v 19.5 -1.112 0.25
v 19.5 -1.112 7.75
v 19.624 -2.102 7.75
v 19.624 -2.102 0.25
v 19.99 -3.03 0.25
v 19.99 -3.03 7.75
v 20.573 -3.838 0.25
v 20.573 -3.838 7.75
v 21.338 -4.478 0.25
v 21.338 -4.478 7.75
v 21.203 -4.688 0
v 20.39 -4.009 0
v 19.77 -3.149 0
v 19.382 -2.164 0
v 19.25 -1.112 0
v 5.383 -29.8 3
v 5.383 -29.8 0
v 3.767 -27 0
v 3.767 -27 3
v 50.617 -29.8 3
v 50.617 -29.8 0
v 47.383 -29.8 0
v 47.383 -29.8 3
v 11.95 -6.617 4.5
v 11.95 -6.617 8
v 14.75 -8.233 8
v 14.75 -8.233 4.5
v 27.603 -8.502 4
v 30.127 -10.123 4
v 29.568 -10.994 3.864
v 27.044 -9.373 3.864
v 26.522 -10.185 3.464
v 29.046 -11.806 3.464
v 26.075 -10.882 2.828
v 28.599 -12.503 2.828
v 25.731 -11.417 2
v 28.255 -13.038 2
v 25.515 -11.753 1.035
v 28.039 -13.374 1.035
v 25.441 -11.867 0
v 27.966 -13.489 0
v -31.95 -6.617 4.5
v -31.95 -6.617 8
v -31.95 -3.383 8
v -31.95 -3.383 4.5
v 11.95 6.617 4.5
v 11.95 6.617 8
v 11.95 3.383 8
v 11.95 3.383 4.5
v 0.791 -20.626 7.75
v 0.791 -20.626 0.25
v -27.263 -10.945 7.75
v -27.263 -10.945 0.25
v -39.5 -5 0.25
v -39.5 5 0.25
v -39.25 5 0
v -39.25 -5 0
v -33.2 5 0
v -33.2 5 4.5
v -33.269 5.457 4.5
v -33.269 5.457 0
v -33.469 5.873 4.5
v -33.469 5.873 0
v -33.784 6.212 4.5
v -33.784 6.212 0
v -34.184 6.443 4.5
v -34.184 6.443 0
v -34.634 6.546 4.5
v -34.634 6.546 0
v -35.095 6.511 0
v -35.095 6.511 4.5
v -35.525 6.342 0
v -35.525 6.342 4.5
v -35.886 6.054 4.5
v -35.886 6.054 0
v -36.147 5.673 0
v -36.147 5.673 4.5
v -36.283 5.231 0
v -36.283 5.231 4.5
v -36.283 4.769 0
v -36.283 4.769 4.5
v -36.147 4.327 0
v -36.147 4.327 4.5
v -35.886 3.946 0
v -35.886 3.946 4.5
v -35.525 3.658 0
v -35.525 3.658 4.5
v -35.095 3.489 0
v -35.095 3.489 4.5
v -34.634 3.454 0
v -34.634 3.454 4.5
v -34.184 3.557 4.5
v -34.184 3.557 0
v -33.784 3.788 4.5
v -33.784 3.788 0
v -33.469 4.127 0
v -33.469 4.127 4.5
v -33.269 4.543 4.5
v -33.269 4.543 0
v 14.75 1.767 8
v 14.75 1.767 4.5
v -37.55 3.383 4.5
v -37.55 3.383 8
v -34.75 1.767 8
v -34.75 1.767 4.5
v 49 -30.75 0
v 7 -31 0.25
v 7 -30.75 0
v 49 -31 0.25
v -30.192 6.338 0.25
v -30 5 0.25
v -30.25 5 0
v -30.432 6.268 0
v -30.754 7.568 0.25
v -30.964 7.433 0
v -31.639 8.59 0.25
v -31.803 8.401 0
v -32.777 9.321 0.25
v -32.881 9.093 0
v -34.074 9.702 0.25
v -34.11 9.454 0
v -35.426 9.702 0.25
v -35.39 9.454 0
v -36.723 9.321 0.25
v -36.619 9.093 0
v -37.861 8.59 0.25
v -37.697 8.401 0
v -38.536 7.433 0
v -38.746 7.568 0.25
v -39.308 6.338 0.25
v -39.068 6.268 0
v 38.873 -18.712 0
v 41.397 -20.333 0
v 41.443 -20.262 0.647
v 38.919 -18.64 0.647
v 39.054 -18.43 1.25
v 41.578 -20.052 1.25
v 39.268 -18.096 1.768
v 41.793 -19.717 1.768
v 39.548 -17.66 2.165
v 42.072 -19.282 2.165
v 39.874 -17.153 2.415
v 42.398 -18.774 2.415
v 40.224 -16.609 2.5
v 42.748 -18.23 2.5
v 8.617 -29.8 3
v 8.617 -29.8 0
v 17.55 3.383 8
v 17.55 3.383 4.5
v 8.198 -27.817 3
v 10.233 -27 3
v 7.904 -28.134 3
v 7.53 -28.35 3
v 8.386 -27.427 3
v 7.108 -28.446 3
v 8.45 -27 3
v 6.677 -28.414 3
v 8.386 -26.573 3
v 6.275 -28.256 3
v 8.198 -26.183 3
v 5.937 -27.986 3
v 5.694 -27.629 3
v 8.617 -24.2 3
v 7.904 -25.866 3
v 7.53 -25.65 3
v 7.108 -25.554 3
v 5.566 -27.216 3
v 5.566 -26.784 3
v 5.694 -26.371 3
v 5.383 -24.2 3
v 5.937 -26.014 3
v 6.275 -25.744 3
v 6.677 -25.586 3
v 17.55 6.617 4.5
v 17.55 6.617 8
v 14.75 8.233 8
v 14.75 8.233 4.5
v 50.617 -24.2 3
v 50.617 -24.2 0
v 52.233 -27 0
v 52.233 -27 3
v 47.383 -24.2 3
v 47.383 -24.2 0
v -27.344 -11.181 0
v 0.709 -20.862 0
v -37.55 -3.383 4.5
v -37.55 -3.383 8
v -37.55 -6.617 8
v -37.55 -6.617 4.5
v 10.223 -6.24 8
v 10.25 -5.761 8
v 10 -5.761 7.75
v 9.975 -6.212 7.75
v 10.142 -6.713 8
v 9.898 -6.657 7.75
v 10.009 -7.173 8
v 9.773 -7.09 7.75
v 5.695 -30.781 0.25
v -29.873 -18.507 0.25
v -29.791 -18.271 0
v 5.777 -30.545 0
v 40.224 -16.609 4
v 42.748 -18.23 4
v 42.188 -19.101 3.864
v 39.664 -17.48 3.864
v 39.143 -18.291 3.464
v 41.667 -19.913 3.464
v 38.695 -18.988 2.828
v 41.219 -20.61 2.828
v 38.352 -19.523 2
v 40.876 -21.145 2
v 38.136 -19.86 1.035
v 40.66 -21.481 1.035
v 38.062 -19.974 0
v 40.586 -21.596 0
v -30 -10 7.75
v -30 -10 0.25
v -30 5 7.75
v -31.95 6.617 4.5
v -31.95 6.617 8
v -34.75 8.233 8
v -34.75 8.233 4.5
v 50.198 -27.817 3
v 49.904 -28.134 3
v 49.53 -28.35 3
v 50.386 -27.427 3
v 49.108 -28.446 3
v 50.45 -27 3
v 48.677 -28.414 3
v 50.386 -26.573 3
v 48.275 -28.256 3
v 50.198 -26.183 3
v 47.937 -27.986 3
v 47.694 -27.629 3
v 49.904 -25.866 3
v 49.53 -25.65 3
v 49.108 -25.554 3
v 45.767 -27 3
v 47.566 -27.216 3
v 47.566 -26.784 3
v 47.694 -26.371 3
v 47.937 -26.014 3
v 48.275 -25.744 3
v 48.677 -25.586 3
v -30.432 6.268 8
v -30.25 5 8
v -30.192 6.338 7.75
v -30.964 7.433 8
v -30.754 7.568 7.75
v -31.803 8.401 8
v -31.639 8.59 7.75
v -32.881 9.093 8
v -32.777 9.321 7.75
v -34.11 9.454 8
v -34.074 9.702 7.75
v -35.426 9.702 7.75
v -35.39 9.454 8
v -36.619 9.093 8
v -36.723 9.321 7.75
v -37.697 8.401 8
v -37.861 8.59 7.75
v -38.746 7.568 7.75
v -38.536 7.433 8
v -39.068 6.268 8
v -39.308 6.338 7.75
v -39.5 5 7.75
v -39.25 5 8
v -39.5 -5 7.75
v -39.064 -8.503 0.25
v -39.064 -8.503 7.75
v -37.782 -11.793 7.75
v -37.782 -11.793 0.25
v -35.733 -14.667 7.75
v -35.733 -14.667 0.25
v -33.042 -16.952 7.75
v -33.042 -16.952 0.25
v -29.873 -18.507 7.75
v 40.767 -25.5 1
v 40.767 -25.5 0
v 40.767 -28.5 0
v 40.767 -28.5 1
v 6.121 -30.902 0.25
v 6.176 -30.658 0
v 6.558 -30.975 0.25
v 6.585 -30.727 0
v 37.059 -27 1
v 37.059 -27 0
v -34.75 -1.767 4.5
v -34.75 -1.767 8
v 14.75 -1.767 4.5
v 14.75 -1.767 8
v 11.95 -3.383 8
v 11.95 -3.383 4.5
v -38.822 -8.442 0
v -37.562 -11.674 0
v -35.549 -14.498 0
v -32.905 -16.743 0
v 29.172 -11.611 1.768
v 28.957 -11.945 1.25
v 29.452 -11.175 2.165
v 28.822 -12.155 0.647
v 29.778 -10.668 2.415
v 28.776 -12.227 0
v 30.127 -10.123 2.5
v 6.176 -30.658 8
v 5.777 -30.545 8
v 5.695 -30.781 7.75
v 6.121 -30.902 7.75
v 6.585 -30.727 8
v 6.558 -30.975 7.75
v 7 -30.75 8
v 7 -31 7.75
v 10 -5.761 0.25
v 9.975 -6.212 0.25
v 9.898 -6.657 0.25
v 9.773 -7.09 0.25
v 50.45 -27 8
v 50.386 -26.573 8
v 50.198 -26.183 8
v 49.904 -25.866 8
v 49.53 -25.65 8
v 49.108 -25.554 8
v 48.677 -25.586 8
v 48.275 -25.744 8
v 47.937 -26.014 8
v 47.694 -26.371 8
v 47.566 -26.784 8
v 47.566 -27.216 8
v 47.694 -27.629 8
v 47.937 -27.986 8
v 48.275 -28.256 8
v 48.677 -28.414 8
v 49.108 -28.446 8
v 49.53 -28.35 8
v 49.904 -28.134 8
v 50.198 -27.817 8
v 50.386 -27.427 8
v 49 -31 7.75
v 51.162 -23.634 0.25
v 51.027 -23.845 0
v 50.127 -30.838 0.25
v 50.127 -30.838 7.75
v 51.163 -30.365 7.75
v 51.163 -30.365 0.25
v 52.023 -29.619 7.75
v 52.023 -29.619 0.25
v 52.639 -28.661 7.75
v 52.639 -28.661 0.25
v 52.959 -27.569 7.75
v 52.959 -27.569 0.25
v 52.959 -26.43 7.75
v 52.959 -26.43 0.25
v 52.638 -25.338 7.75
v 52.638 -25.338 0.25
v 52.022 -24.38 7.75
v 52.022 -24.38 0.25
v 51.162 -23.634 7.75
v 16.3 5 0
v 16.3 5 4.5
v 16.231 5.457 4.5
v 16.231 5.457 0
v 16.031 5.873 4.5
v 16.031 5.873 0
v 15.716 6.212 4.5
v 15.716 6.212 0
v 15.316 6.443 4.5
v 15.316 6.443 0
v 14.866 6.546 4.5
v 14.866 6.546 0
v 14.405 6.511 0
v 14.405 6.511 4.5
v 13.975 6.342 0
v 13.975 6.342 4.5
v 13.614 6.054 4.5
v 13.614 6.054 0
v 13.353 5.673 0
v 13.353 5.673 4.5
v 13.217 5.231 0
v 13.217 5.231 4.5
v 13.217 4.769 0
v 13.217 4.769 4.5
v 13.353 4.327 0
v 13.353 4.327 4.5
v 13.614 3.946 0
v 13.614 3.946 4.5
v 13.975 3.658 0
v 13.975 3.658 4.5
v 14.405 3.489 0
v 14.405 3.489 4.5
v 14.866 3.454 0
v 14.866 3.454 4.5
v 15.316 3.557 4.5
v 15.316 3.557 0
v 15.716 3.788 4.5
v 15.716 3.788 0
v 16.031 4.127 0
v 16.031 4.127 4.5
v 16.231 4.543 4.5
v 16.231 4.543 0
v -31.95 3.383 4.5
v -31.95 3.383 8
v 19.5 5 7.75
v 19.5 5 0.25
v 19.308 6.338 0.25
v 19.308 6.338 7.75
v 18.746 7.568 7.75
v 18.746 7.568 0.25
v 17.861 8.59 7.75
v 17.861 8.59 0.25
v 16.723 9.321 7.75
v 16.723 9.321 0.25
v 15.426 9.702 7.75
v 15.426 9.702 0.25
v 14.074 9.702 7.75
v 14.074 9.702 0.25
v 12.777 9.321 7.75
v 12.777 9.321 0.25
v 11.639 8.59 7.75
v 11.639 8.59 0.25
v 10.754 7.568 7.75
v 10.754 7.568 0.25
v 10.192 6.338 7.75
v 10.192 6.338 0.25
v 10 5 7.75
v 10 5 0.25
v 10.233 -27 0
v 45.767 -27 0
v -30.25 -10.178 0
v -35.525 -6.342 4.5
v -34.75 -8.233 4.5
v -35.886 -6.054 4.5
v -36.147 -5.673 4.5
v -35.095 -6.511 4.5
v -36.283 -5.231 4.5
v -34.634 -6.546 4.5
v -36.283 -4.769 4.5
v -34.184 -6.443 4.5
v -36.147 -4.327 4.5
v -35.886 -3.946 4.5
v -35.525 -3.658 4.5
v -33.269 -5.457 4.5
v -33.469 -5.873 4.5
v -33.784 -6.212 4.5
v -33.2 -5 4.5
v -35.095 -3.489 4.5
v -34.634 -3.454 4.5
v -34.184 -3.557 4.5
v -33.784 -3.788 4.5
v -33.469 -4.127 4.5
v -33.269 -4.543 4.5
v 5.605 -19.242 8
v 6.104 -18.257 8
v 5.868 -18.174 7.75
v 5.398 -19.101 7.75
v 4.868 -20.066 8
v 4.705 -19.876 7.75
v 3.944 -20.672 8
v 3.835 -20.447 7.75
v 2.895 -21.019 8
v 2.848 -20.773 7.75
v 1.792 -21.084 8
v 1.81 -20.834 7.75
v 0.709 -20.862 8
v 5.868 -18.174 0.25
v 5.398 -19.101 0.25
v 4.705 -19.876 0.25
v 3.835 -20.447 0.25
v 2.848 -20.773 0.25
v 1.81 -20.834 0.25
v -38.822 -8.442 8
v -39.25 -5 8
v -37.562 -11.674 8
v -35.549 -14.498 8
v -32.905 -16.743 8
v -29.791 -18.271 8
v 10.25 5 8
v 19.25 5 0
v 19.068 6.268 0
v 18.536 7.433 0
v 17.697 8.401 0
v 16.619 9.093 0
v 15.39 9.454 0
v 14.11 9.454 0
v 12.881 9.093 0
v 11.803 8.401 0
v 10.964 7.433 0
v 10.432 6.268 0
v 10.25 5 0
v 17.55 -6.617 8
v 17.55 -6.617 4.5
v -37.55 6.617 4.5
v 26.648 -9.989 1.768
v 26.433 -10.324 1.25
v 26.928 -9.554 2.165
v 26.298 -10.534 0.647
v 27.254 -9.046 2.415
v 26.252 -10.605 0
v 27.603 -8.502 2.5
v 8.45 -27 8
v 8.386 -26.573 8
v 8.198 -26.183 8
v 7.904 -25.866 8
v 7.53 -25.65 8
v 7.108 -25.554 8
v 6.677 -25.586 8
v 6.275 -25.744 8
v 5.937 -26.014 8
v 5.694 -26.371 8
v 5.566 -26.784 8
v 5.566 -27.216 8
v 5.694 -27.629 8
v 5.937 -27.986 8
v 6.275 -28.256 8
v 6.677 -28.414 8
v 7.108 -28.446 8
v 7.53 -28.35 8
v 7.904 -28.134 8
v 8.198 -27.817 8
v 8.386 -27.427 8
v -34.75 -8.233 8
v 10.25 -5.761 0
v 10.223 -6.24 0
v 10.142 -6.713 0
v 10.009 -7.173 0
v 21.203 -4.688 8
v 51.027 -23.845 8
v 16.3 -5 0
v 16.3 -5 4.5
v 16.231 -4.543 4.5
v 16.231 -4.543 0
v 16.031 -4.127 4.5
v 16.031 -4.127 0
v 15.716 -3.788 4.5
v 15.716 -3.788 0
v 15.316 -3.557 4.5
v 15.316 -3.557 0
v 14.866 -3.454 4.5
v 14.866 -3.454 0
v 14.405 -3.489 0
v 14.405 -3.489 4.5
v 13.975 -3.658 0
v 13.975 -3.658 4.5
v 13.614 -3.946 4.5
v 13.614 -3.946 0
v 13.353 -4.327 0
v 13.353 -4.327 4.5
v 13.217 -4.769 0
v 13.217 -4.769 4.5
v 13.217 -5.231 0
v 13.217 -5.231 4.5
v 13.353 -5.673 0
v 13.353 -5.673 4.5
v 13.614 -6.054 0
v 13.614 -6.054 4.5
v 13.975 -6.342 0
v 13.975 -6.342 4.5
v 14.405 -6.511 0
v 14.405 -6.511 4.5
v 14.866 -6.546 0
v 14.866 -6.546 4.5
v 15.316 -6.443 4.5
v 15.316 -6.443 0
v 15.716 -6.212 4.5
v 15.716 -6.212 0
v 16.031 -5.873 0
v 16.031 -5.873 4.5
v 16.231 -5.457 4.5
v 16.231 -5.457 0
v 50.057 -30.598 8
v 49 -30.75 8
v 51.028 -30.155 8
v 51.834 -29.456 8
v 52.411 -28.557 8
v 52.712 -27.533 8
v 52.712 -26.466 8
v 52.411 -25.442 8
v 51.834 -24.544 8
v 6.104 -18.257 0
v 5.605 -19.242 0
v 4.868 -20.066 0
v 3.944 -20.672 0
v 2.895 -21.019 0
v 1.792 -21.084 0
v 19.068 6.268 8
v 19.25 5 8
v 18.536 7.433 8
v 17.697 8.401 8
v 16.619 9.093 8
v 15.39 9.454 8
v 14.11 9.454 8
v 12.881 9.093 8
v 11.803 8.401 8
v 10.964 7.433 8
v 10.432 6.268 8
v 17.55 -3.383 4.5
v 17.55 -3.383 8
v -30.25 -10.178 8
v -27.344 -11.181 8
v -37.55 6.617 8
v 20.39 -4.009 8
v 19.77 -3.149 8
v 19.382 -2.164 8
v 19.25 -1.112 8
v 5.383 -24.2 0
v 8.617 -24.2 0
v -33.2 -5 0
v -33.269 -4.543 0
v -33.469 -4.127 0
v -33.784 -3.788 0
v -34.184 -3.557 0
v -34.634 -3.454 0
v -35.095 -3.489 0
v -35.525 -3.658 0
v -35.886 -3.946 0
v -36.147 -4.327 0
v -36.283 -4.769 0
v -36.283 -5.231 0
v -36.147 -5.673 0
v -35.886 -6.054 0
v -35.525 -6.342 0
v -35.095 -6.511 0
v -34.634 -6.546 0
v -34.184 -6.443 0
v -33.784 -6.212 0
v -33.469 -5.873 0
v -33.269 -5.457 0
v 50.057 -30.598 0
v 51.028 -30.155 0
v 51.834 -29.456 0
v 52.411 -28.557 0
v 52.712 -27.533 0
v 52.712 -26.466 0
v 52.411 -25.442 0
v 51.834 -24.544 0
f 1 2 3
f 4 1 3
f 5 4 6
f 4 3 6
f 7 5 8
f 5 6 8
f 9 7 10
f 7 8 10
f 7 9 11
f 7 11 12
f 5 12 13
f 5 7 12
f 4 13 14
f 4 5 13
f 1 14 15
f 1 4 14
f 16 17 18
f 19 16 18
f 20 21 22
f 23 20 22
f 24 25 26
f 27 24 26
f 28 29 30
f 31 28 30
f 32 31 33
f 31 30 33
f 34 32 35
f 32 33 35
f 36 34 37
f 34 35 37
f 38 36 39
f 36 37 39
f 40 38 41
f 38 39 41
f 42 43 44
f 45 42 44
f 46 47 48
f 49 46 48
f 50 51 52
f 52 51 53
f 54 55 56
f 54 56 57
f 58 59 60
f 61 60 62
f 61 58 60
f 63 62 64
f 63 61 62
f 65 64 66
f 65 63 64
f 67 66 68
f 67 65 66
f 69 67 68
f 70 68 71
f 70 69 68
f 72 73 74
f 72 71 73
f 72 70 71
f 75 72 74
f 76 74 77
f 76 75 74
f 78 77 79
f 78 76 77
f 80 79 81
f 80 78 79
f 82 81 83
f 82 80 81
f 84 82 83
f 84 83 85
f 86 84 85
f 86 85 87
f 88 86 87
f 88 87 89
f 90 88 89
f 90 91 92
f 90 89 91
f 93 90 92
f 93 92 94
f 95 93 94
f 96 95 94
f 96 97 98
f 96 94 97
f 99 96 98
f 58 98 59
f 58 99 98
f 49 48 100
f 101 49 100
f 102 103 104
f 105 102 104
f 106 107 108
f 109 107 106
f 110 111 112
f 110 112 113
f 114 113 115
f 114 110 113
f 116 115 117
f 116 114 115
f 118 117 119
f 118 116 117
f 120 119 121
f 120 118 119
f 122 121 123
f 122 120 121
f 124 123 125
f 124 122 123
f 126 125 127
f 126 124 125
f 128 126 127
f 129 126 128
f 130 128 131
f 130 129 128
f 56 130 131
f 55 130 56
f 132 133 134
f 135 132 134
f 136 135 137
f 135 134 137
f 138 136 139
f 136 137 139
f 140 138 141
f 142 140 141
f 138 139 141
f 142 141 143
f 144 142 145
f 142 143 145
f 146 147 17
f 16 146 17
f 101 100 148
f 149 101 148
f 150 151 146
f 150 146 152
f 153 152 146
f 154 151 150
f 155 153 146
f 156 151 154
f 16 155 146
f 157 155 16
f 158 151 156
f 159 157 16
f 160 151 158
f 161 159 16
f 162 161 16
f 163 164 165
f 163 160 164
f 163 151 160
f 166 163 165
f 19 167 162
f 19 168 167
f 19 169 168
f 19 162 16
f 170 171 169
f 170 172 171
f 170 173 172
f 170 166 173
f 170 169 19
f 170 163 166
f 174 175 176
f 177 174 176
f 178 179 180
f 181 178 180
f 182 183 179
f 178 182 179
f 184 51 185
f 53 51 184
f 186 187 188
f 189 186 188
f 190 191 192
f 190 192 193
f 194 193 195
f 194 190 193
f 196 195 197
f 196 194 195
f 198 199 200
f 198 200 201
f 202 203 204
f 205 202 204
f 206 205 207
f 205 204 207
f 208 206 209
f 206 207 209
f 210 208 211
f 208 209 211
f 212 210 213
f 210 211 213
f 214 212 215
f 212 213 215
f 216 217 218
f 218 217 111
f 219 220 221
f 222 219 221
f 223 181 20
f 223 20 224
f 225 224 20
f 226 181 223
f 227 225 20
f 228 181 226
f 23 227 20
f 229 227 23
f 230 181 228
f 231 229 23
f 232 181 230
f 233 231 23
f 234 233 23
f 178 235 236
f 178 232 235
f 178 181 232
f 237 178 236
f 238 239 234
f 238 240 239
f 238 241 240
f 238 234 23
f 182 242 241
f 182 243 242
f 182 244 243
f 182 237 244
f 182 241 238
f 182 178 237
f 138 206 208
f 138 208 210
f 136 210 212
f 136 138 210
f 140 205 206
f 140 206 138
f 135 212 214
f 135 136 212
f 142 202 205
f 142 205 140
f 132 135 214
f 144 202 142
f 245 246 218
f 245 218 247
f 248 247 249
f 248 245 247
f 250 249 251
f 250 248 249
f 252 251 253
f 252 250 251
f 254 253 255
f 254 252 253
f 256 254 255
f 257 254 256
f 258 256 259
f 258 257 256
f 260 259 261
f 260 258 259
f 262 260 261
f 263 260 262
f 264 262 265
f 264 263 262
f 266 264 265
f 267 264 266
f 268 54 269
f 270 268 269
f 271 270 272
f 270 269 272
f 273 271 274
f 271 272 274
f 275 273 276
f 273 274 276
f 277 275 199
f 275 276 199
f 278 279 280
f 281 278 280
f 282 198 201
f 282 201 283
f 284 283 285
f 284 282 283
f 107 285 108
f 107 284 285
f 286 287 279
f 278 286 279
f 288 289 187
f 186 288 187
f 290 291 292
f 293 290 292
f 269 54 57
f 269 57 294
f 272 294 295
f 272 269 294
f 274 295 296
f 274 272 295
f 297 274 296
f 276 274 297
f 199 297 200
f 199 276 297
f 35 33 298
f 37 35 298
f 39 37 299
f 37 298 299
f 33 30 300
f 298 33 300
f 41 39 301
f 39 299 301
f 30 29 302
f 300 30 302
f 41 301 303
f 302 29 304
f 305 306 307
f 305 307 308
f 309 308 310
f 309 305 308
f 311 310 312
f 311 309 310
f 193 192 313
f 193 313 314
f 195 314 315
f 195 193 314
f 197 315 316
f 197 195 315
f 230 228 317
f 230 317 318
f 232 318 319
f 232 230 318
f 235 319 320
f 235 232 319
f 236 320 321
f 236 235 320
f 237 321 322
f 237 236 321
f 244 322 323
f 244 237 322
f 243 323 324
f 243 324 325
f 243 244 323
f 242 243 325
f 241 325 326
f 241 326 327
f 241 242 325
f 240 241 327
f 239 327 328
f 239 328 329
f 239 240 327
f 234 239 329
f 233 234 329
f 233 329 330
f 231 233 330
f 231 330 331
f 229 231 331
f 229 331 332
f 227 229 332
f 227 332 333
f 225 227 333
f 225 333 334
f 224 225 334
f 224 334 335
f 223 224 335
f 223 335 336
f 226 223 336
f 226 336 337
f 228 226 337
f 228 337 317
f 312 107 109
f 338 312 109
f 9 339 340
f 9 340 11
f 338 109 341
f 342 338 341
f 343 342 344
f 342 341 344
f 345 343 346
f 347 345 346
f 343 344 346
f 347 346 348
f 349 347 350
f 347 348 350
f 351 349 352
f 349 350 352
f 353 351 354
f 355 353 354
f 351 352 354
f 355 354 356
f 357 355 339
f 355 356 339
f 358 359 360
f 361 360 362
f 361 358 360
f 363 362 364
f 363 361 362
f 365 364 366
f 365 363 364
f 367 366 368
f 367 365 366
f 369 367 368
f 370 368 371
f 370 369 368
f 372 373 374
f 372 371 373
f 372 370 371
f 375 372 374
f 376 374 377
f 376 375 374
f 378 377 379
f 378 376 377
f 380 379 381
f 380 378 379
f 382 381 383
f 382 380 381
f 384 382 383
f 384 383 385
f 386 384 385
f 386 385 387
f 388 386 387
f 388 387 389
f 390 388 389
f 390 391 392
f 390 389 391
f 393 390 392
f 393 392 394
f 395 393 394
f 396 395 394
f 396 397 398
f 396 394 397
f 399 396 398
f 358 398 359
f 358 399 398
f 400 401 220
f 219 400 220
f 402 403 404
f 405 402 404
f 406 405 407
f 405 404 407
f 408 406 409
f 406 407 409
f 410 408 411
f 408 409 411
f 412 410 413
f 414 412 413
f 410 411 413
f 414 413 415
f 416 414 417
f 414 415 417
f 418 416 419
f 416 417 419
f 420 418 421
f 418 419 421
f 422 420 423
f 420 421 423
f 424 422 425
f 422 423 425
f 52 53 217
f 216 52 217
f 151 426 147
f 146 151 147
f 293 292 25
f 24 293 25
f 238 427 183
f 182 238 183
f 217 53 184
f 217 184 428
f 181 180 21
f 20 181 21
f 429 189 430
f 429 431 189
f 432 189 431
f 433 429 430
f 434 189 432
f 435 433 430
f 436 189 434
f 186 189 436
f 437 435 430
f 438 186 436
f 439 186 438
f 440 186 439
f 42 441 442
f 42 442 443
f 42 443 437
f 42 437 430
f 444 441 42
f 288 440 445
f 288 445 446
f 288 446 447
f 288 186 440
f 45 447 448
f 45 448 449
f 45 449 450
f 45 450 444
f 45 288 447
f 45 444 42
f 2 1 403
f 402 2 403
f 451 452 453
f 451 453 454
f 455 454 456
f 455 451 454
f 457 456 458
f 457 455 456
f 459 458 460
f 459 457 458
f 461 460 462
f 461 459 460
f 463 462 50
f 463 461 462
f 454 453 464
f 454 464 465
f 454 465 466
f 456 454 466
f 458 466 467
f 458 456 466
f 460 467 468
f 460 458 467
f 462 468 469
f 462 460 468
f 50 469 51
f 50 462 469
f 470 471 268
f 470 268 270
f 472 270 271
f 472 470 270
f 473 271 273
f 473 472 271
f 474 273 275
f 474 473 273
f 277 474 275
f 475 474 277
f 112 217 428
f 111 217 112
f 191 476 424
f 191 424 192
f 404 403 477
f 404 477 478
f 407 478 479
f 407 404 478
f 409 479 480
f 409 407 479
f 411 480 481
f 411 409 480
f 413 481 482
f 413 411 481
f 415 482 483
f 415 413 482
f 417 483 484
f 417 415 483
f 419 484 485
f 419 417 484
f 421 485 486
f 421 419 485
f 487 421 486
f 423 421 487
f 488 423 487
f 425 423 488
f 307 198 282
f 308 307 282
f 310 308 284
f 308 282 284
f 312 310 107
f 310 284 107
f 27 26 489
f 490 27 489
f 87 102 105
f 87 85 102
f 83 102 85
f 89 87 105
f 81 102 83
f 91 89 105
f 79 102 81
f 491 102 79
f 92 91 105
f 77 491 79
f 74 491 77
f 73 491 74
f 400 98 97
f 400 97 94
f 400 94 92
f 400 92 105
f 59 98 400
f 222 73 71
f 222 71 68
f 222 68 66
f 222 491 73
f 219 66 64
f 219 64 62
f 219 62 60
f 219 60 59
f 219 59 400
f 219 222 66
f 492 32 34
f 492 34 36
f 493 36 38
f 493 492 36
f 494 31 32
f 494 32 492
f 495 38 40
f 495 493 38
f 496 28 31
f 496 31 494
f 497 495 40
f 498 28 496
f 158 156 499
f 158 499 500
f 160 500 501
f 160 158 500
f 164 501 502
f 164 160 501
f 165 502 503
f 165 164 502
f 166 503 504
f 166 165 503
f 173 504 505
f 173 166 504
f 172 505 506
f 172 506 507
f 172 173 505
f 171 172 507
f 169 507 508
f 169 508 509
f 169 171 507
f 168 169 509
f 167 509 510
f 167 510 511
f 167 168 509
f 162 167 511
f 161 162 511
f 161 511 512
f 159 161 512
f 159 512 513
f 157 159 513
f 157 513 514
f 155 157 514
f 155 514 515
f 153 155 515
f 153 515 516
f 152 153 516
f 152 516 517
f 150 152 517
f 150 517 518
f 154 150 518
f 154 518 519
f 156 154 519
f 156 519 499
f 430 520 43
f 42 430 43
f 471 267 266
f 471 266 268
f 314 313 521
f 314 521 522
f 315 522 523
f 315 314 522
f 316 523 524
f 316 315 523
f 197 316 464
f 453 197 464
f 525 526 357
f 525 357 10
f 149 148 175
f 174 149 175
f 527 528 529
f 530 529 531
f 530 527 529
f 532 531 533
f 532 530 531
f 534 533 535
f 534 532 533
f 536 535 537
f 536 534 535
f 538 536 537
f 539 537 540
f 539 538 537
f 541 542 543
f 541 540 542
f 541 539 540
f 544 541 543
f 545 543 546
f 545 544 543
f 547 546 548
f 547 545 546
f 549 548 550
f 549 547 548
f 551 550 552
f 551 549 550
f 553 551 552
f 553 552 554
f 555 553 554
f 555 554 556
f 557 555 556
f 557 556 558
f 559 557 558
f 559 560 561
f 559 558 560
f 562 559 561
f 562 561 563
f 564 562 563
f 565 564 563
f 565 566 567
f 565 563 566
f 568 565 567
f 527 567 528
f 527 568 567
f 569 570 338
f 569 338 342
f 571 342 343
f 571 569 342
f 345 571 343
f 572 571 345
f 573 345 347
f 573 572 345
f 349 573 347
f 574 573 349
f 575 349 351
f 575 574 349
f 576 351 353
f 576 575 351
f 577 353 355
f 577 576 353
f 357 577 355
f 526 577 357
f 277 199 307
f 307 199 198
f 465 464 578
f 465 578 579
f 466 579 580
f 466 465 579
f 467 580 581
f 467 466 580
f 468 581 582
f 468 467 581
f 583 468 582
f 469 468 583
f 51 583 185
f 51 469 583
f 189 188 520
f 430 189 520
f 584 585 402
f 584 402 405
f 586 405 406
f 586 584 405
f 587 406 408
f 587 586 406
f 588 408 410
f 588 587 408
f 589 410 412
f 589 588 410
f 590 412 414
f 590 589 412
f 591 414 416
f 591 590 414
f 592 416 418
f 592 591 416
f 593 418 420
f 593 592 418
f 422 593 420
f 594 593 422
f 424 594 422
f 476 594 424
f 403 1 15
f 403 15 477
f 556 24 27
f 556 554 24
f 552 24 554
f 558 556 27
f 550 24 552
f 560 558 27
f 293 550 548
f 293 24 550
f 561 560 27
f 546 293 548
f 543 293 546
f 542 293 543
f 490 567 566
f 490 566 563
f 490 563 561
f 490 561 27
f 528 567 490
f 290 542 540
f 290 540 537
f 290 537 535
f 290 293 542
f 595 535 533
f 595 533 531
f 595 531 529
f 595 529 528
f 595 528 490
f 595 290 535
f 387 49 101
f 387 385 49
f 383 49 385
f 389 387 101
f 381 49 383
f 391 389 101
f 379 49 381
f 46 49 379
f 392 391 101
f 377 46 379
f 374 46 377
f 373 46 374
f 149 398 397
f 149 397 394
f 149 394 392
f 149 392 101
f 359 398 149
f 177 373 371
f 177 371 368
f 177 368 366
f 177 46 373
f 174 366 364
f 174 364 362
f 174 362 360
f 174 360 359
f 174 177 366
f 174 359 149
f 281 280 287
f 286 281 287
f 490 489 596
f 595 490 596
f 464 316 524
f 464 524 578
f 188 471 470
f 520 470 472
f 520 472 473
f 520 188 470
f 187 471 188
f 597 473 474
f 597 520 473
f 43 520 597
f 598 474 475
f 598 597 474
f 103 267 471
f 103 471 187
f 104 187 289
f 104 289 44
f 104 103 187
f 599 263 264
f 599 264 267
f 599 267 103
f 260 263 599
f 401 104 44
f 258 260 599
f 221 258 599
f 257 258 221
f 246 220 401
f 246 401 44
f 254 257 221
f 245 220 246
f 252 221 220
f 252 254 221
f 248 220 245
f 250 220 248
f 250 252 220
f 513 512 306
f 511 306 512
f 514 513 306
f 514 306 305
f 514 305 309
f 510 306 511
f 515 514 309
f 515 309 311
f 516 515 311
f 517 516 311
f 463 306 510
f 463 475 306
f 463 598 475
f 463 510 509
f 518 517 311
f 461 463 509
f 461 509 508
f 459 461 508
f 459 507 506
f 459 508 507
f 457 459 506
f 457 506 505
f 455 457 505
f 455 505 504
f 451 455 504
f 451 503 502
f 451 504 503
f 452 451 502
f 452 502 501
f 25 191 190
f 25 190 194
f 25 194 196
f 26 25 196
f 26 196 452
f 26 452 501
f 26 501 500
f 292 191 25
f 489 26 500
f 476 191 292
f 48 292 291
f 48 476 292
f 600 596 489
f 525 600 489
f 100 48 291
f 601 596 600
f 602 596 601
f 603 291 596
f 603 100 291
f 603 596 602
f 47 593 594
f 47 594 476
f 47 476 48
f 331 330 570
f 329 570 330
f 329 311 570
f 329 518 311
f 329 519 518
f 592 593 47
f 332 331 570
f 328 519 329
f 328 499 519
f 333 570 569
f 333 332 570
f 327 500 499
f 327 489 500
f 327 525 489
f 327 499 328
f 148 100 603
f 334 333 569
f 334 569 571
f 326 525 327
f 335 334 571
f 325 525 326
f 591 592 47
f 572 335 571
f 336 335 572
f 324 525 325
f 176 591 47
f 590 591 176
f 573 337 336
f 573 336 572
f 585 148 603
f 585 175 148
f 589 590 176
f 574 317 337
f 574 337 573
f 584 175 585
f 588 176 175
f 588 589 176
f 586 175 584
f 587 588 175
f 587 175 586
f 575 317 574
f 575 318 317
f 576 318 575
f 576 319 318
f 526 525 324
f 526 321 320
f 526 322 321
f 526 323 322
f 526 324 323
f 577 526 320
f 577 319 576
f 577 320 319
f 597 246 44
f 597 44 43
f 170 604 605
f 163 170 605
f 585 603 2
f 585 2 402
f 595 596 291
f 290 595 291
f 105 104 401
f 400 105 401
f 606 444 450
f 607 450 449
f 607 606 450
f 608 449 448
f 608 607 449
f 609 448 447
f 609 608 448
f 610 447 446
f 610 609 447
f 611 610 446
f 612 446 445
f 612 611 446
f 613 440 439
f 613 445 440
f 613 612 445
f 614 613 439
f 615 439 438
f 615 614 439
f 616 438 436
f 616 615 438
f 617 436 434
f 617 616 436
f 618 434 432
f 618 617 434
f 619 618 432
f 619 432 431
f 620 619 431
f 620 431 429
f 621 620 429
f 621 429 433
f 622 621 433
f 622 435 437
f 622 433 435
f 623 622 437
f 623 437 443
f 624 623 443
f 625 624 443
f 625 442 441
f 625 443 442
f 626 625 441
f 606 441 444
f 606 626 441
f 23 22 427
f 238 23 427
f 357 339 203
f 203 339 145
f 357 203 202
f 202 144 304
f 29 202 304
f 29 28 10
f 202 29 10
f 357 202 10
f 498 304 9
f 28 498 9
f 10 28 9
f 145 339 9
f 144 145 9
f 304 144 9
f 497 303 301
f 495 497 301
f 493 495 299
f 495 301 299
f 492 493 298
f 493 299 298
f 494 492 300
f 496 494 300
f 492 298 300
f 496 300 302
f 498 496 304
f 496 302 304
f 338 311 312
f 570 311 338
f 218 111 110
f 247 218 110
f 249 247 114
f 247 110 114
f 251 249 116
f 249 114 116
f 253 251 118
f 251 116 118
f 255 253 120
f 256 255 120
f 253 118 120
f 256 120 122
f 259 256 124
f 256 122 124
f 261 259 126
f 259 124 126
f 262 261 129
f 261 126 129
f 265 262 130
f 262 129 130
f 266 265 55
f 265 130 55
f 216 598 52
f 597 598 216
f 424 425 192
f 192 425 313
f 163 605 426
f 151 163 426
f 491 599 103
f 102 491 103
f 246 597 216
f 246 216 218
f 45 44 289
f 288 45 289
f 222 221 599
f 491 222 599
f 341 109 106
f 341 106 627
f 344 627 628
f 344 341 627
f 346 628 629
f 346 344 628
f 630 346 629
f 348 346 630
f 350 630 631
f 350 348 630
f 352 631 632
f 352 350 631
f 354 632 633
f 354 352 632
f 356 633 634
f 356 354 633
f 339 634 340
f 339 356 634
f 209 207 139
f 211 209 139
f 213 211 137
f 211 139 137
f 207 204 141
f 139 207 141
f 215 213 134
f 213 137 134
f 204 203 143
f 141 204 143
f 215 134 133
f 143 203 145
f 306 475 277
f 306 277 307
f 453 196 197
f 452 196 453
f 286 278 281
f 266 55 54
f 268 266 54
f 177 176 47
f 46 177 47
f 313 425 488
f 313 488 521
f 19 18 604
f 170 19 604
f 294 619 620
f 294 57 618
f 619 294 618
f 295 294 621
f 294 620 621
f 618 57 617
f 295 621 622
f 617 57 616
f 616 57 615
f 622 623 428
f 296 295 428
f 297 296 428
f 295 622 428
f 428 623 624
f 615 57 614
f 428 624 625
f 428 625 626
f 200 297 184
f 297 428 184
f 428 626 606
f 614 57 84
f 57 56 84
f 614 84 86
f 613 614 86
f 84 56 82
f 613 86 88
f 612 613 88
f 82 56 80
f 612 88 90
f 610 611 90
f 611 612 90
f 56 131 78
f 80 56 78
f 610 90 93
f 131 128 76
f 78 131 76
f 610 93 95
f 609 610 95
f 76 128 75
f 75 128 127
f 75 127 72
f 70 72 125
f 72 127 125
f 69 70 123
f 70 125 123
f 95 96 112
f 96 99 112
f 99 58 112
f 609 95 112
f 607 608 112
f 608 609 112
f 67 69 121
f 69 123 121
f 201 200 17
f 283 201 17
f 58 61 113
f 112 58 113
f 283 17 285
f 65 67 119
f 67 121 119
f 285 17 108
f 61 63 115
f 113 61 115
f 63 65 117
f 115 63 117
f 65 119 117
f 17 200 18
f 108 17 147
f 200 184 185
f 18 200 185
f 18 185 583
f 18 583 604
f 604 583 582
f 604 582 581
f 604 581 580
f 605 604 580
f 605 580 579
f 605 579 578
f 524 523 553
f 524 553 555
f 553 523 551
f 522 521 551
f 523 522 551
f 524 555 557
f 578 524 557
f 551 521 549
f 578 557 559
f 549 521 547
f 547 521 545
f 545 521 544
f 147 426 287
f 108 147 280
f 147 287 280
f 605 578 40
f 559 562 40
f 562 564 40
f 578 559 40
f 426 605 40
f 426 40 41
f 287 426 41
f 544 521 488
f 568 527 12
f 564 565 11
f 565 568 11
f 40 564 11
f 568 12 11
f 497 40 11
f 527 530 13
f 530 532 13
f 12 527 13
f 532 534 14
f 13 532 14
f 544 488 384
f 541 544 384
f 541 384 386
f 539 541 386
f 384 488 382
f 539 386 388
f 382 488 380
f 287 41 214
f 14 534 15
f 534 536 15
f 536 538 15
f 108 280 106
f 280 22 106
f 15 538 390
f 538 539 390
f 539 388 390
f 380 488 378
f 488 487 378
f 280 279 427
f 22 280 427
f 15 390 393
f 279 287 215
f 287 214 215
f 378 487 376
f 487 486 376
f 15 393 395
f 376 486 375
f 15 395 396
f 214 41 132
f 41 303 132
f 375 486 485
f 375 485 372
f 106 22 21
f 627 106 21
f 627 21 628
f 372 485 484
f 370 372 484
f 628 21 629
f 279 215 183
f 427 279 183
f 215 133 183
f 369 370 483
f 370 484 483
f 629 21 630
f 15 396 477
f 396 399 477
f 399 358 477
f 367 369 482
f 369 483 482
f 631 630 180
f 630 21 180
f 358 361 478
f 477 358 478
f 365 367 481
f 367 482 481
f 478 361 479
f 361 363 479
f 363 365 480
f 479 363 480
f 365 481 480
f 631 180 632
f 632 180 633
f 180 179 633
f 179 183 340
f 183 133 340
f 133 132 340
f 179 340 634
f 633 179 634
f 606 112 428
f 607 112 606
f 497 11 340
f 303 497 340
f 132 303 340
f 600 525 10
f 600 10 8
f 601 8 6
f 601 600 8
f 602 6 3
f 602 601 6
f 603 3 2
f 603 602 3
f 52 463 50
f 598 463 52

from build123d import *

# Parameters (mm, degrees)
SZKIC1_R                    = 1.55
SZKIC1_R_2                  = 1.45
DODANIE_WYCI_GNI_CIE1_DEPTH = 8
WYTNIJ_WYCI_GNI_CIE1_DEPTH  = 3
ZAOKR_GLENIE1_R             = 4
WYTNIJ_WYCI_GNI_CIE2_DEPTH  = 3.5
SFAZOWANIE1_SIZE            = 0.25
WYTNIJ_WYCI_GNI_CIE3_DEPTH  = 1
WYTNIJ_WYCI_GNI_CIE4_DEPTH  = 3
SZYK_LINIOWY1_COUNT         = 2
SZYK_LINIOWY1_PITCH         = 15


with BuildPart() as part:
    # Szkic1 → Dodanie-wyciągnięcie1 (new body)
    # profile 1 of 17: a face of its own
    with BuildSketch(Plane.XY):
        with BuildLine():
            Line((-30, -5), (-30, 5))
            ThreePointArc((-30, 5), (-34.75, 9.75), (-39.5, 5))
            Line((-39.5, 5), (-39.5, -5))
            ThreePointArc((-39.5, -5), (-34.75, -9.75), (-30, -5))
        make_face()
        with Locations((-34.75, -5)):
            Circle(SZKIC1_R, mode=Mode.SUBTRACT)
        with Locations((-34.75, 5)):
            Circle(SZKIC1_R, mode=Mode.SUBTRACT)
    # profile 2 of 17: a face of its own
    with BuildSketch(Plane.XY):
        with BuildLine():
            Line((-30, -10), (-30, -5))
            ThreePointArc((-30, -5), (-34.75, -9.75), (-39.5, -5))
            ThreePointArc((-39.5, -5), (-36.846817098, -13.293438899), (-29.872582883, -18.506937282))
            ThreePointArc((-29.872582883, -18.506937282), (-32.348896474, -13.420890585), (-27.262849777, -10.944576994))
            Line((-27.262849777, -10.944576994), (-30, -10))
        make_face()
    # profile 3 of 17: a face of its own
    with BuildSketch(Plane.XY):
        with BuildLine():
            Line((4.547807332, -21.922277315), (-27.262849777, -10.944576994))
            ThreePointArc((-27.262849777, -10.944576994), (-32.348896474, -13.420890585), (-29.872582883, -18.506937282))
            Line((-29.872582883, -18.506937282), (5.695133447, -30.781180144))
            ThreePointArc((5.695133447, -30.781180144), (3.398037408, -28.739501506), (3.227247846, -25.670962309))
            Line((3.227247846, -25.670962309), (4.547807332, -21.922277315))
        make_face()
    # profile 4 of 17: a face of its own
    with BuildSketch(Plane.XY):
        with BuildLine():
            Line((7.670780796, -23), (4.547807332, -21.922277315))
            Line((4.547807332, -21.922277315), (3.227247846, -25.670962309))
            ThreePointArc((3.227247846, -25.670962309), (4.688739604, -23.735329208), (7, -23))
            Line((7, -23), (7.670780796, -23))
        make_face()
    # profile 5 of 17: a face of its own
    with BuildSketch(Plane.XY):
        with BuildLine():
            Line((10, -6.445085227), (4.547807332, -21.922277315))
            Line((4.547807332, -21.922277315), (7.670780796, -23))
            Line((7.670780796, -23), (12.650026795, -23))
            Line((12.650026795, -23), (16.842670109, -11.098302851))
            Line((16.842670109, -11.098302851), (14.743601006, -9.74999569))
            ThreePointArc((14.743601006, -9.74999569), (11.798045524, -8.721352546), (10.126086359, -6.087162658))
            Line((10.126086359, -6.087162658), (10, -6.445085227))
        make_face()
    # profile 6 of 17: a face of its own
    with BuildSketch(Plane.XY):
        with BuildLine():
            ThreePointArc((3.227247846, -25.670962309), (3.398037408, -28.739501506), (5.695133447, -30.781180144))
            ThreePointArc((5.695133447, -30.781180144), (6.338456568, -30.944915752), (7, -31))
            ThreePointArc((7, -31), (9.311260396, -30.264670792), (10.772752154, -28.329037691))
            ThreePointArc((10.772752154, -28.329037691), (10.601962592, -25.260498494), (8.304866553, -23.218819856))
            Line((8.304866553, -23.218819856), (7.670780796, -23))
            Line((7.670780796, -23), (7, -23))
            ThreePointArc((7, -23), (4.688739604, -23.735329208), (3.227247846, -25.670962309))
        make_face()
        with Locations((7, -27)):
            Circle(SZKIC1_R_2, mode=Mode.SUBTRACT)
    # profile 7 of 17: a face of its own
    with BuildSketch(Plane.XY):
        with BuildLine():
            Line((10, -5), (10, -6.445085227))
            Line((10, -6.445085227), (10.126086359, -6.087162658))
            ThreePointArc((10.126086359, -6.087162658), (10.03162688, -5.547224911), (10, -5))
        make_face()
    # profile 8 of 17: a face of its own
    with BuildSketch(Plane.XY):
        with BuildLine():
            Line((12.650026795, -23), (7.670780796, -23))
            Line((7.670780796, -23), (8.304866553, -23.218819856))
            ThreePointArc((8.304866553, -23.218819856), (10.601962592, -25.260498494), (10.772752154, -28.329037691))
            Line((10.772752154, -28.329037691), (12.650026795, -23))
        make_face()
    # profile 9 of 17: a face of its own
    with BuildSketch(Plane.XY):
        with BuildLine():
            ThreePointArc((10.772752154, -28.329037691), (9.311260396, -30.264670792), (7, -31))
            Line((7, -31), (49, -31))
            ThreePointArc((49, -31), (47.873511508, -30.838101572), (46.838211374, -30.365511839))
            Line((46.838211374, -30.365511839), (35.371448625, -23))
            Line((35.371448625, -23), (12.650026795, -23))
            Line((12.650026795, -23), (10.772752154, -28.329037691))
        make_face()
    # profile 10 of 17: a face of its own
    with BuildSketch(Plane.XY):
        with BuildLine():
            ThreePointArc((10, -5), (10.03162688, -5.547224911), (10.126086359, -6.087162658))
            Line((10.126086359, -6.087162658), (10.977247846, -3.670962309))
            ThreePointArc((10.977247846, -3.670962309), (13.45169048, -1.216563415), (16.911788626, -1.634488161))
            Line((16.911788626, -1.634488161), (19.5, -3.296988898))
            Line((19.5, -3.296988898), (19.5, 5))
            ThreePointArc((19.5, 5), (14.75, 9.75), (10, 5))
            Line((10, 5), (10, -5))
        make_face()
        with Locations((14.75, 5)):
            Circle(SZKIC1_R, mode=Mode.SUBTRACT)
    # profile 11 of 17: a face of its own
    with BuildSketch(Plane.XY):
        with BuildLine():
            Line((10.977247846, -3.670962309), (10.126086359, -6.087162658))
            ThreePointArc((10.126086359, -6.087162658), (11.798045524, -8.721352546), (14.743601006, -9.74999569))
            Line((14.743601006, -9.74999569), (12.588211374, -8.365511839))
            ThreePointArc((12.588211374, -8.365511839), (10.966563415, -6.29830952), (10.977247846, -3.670962309))
        make_face()
    # profile 12 of 17: a face of its own
    with BuildSketch(Plane.XY):
        Polygon((16.842670109, -11.098302851), (12.650026795, -23), (35.371448625, -23), align=None)
    # profile 13 of 17: a face of its own
    with BuildSketch(Plane.XY):
        with BuildLine():
            ThreePointArc((46.838211374, -30.365511839), (47.873511508, -30.838101572), (49, -31))
            ThreePointArc((49, -31), (52.838101572, -28.126488492), (51.161788626, -23.634488161))
            ThreePointArc((51.161788626, -23.634488161), (50.126488492, -23.161898428), (49, -23))
            Line((49, -23), (35.371448625, -23))
            Line((35.371448625, -23), (46.838211374, -30.365511839))
        make_face()
        with Locations((49, -27)):
            Circle(SZKIC1_R_2, mode=Mode.SUBTRACT)
    # profile 14 of 17: a face of its own
    with BuildSketch(Plane.XY):
        with BuildLine():
            ThreePointArc((16.911788626, -1.634488161), (13.45169048, -1.216563415), (10.977247846, -3.670962309))
            ThreePointArc((10.977247846, -3.670962309), (10.966563415, -6.29830952), (12.588211374, -8.365511839))
            Line((12.588211374, -8.365511839), (14.743601006, -9.74999569))
            ThreePointArc((14.743601006, -9.74999569), (16.291742556, -9.492830944), (17.671590668, -8.745238039))
            Line((17.671590668, -8.745238039), (18.522752154, -6.329037691))
            ThreePointArc((18.522752154, -6.329037691), (18.533436585, -3.70169048), (16.911788626, -1.634488161))
        make_face()
        with Locations((14.75, -5)):
            Circle(SZKIC1_R, mode=Mode.SUBTRACT)
    # profile 15 of 17: a face of its own
    with BuildSketch(Plane.XY):
        with BuildLine():
            ThreePointArc((17.671590668, -8.745238039), (16.291742556, -9.492830944), (14.743601006, -9.74999569))
            Line((14.743601006, -9.74999569), (16.842670109, -11.098302851))
            Line((16.842670109, -11.098302851), (17.671590668, -8.745238039))
        make_face()
    # profile 16 of 17: a face of its own
    with BuildSketch(Plane.XY):
        with BuildLine():
            Line((16.842670109, -11.098302851), (35.371448625, -23))
            Line((35.371448625, -23), (49, -23))
            ThreePointArc((49, -23), (50.126488492, -23.161898428), (51.161788626, -23.634488161))
            Line((51.161788626, -23.634488161), (19.5, -3.296988898))
            Line((19.5, -3.296988898), (19.5, -5))
            ThreePointArc((19.5, -5), (19.018492455, -7.083859919), (17.671590668, -8.745238039))
            Line((17.671590668, -8.745238039), (16.842670109, -11.098302851))
        make_face()
    # profile 17 of 17: a face of its own
    with BuildSketch(Plane.XY):
        with BuildLine():
            Line((19.5, -3.296988898), (16.911788626, -1.634488161))
            ThreePointArc((16.911788626, -1.634488161), (18.533436585, -3.70169048), (18.522752154, -6.329037691))
            Line((18.522752154, -6.329037691), (17.671590668, -8.745238039))
            ThreePointArc((17.671590668, -8.745238039), (19.018492455, -7.083859919), (19.5, -5))
            Line((19.5, -5), (19.5, -3.296988898))
        make_face()
    extrude(amount=DODANIE_WYCI_GNI_CIE1_DEPTH)

    # Szkic2 → Wytnij-wyciągnięcie1 (cut)
    with BuildSketch(Plane(origin=(0, 0, 0), x_dir=(-1, 0, 0), z_dir=(0, 0, -1))):
        Polygon((-45.766838493, -27), (-47.383419246, -24.2), (-50.616580754, -24.2), (-52.233161507, -27), (-50.616580754, -29.8), (-47.383419246, -29.8), align=None)
        Polygon((-10.233161507, -27), (-8.616580754, -29.8), (-5.383419246, -29.8), (-3.766838493, -27), (-5.383419246, -24.2), (-8.616580754, -24.2), align=None)
    extrude(amount=-WYTNIJ_WYCI_GNI_CIE1_DEPTH, mode=Mode.SUBTRACT)

    # Zaokrąglenie1
    zaokr_glenie1_edges = [part.edges().sort_by_distance(p)[0] for p in [
        (4.547807332, -21.922277315, 4),
        (10, -6.445085227, 4),
        (19.5, -3.296988898, 4),
    ]]
    fillet(zaokr_glenie1_edges, radius=ZAOKR_GLENIE1_R)

    # Szkic3 → Wytnij-wyciągnięcie2 (cut)
    with BuildSketch(Plane.XY.offset(8)):
        Polygon((-34.75, 1.766838493), (-31.95, 3.383419246), (-31.95, 6.616580754), (-34.75, 8.233161507), (-37.55, 6.616580754), (-37.55, 3.383419246), align=None)
        Polygon((-34.75, -8.233161507), (-31.95, -6.616580754), (-31.95, -3.383419246), (-34.75, -1.766838493), (-37.55, -3.383419246), (-37.55, -6.616580754), align=None)
        Polygon((14.75, 1.766838493), (17.55, 3.383419246), (17.55, 6.616580754), (14.75, 8.233161507), (11.95, 6.616580754), (11.95, 3.383419246), align=None)
        Polygon((14.75, -8.233161507), (17.55, -6.616580754), (17.55, -3.383419246), (14.75, -1.766838493), (11.95, -3.383419246), (11.95, -6.616580754), align=None)
    extrude(amount=-WYTNIJ_WYCI_GNI_CIE2_DEPTH, mode=Mode.SUBTRACT)

    # Sfazowanie1
    sfazowanie1_edges = [part.edges().sort_by_distance(p)[0] for p in [
        (36.25, -14.056112985, 8),
        (7.820559487, -12.631884103, 0),
        (7.820559487, -12.631884103, 8),
        (-14.604625944, -15.312867387, 0),
        (-14.604625944, -15.312867387, 8),
        (19.9895047, -3.029625968, 0),
        (19.9895047, -3.029625968, 8),
        (9.942778755, -6.435301151, 0),
        (9.942778755, -6.435301151, 8),
        (3.835116171, -20.446517222, 0),
        (3.835116171, -20.446517222, 8),
        (19.5, 1.943887015, 8),
        (14.75, 9.75, 8),
        (10, -0.380569097, 8),
        (52.838101572, -28.126488492, 0),
        (28, -31, 0),
        (6.338456568, -30.944915752, 0),
        (-12.088724718, -24.644058713, 0),
        (-36.846817098, -13.293438899, 0),
        (-39.5, 0, 0),
        (-34.75, 9.75, 0),
        (-30, -2.5, 0),
        (10, -0.380569097, 0),
        (14.75, 9.75, 0),
        (19.5, 1.943887015, 0),
        (36.25, -14.056112985, 0),
        (-30, -2.5, 8),
        (-34.75, 9.75, 8),
        (-39.5, 0, 8),
        (-36.846817098, -13.293438899, 8),
        (-12.088724718, -24.644058713, 8),
        (6.338456568, -30.944915752, 8),
        (28, -31, 8),
        (52.838101572, -28.126488492, 8),
    ]]
    chamfer(sfazowanie1_edges, length=SFAZOWANIE1_SIZE)

    # Szkic4 → Wytnij-wyciągnięcie3 (cut)
    with BuildSketch(Plane(origin=(0, 0, 0), x_dir=(-1, 0, 0), z_dir=(0, 0, -1))):
        Polygon((-40.766838493, -25.5), (-40.766838493, -28.5), (-37.058739249, -27), align=None)
    extrude(amount=-WYTNIJ_WYCI_GNI_CIE3_DEPTH, mode=Mode.SUBTRACT)

    # Szkic5 → Wytnij-wyciągnięcie4 (cut)
    with BuildSketch(Plane(origin=(42.74800903, -18.230016596, 0.25), x_dir=(0, 0, 1), z_dir=(-0.841377959640588, 0.5404471565574577, 0))):
        with BuildLine():
            Line((2.25, 0), (3.75, 0))
            ThreePointArc((3.75, 0), (2.578427125, -2.828427125), (-0.25, -4))
            Line((-0.25, -4), (-0.25, -2.5))
            ThreePointArc((-0.25, -2.5), (1.517766953, -1.767766953), (2.25, 0))
        make_face()
    wytnij_wyci_gni_cie4 = extrude(amount=WYTNIJ_WYCI_GNI_CIE4_DEPTH, mode=Mode.SUBTRACT)

    # Szyk liniowy1: Wytnij-wyciągnięcie4 ×2
    with Locations(*[Vector(-0.8413779596405879, 0.5404471565574578, 0) * (i * SZYK_LINIOWY1_PITCH) for i in range(1, SZYK_LINIOWY1_COUNT)]):
        add(wytnij_wyci_gni_cie4, mode=Mode.SUBTRACT)


solid = part.part
